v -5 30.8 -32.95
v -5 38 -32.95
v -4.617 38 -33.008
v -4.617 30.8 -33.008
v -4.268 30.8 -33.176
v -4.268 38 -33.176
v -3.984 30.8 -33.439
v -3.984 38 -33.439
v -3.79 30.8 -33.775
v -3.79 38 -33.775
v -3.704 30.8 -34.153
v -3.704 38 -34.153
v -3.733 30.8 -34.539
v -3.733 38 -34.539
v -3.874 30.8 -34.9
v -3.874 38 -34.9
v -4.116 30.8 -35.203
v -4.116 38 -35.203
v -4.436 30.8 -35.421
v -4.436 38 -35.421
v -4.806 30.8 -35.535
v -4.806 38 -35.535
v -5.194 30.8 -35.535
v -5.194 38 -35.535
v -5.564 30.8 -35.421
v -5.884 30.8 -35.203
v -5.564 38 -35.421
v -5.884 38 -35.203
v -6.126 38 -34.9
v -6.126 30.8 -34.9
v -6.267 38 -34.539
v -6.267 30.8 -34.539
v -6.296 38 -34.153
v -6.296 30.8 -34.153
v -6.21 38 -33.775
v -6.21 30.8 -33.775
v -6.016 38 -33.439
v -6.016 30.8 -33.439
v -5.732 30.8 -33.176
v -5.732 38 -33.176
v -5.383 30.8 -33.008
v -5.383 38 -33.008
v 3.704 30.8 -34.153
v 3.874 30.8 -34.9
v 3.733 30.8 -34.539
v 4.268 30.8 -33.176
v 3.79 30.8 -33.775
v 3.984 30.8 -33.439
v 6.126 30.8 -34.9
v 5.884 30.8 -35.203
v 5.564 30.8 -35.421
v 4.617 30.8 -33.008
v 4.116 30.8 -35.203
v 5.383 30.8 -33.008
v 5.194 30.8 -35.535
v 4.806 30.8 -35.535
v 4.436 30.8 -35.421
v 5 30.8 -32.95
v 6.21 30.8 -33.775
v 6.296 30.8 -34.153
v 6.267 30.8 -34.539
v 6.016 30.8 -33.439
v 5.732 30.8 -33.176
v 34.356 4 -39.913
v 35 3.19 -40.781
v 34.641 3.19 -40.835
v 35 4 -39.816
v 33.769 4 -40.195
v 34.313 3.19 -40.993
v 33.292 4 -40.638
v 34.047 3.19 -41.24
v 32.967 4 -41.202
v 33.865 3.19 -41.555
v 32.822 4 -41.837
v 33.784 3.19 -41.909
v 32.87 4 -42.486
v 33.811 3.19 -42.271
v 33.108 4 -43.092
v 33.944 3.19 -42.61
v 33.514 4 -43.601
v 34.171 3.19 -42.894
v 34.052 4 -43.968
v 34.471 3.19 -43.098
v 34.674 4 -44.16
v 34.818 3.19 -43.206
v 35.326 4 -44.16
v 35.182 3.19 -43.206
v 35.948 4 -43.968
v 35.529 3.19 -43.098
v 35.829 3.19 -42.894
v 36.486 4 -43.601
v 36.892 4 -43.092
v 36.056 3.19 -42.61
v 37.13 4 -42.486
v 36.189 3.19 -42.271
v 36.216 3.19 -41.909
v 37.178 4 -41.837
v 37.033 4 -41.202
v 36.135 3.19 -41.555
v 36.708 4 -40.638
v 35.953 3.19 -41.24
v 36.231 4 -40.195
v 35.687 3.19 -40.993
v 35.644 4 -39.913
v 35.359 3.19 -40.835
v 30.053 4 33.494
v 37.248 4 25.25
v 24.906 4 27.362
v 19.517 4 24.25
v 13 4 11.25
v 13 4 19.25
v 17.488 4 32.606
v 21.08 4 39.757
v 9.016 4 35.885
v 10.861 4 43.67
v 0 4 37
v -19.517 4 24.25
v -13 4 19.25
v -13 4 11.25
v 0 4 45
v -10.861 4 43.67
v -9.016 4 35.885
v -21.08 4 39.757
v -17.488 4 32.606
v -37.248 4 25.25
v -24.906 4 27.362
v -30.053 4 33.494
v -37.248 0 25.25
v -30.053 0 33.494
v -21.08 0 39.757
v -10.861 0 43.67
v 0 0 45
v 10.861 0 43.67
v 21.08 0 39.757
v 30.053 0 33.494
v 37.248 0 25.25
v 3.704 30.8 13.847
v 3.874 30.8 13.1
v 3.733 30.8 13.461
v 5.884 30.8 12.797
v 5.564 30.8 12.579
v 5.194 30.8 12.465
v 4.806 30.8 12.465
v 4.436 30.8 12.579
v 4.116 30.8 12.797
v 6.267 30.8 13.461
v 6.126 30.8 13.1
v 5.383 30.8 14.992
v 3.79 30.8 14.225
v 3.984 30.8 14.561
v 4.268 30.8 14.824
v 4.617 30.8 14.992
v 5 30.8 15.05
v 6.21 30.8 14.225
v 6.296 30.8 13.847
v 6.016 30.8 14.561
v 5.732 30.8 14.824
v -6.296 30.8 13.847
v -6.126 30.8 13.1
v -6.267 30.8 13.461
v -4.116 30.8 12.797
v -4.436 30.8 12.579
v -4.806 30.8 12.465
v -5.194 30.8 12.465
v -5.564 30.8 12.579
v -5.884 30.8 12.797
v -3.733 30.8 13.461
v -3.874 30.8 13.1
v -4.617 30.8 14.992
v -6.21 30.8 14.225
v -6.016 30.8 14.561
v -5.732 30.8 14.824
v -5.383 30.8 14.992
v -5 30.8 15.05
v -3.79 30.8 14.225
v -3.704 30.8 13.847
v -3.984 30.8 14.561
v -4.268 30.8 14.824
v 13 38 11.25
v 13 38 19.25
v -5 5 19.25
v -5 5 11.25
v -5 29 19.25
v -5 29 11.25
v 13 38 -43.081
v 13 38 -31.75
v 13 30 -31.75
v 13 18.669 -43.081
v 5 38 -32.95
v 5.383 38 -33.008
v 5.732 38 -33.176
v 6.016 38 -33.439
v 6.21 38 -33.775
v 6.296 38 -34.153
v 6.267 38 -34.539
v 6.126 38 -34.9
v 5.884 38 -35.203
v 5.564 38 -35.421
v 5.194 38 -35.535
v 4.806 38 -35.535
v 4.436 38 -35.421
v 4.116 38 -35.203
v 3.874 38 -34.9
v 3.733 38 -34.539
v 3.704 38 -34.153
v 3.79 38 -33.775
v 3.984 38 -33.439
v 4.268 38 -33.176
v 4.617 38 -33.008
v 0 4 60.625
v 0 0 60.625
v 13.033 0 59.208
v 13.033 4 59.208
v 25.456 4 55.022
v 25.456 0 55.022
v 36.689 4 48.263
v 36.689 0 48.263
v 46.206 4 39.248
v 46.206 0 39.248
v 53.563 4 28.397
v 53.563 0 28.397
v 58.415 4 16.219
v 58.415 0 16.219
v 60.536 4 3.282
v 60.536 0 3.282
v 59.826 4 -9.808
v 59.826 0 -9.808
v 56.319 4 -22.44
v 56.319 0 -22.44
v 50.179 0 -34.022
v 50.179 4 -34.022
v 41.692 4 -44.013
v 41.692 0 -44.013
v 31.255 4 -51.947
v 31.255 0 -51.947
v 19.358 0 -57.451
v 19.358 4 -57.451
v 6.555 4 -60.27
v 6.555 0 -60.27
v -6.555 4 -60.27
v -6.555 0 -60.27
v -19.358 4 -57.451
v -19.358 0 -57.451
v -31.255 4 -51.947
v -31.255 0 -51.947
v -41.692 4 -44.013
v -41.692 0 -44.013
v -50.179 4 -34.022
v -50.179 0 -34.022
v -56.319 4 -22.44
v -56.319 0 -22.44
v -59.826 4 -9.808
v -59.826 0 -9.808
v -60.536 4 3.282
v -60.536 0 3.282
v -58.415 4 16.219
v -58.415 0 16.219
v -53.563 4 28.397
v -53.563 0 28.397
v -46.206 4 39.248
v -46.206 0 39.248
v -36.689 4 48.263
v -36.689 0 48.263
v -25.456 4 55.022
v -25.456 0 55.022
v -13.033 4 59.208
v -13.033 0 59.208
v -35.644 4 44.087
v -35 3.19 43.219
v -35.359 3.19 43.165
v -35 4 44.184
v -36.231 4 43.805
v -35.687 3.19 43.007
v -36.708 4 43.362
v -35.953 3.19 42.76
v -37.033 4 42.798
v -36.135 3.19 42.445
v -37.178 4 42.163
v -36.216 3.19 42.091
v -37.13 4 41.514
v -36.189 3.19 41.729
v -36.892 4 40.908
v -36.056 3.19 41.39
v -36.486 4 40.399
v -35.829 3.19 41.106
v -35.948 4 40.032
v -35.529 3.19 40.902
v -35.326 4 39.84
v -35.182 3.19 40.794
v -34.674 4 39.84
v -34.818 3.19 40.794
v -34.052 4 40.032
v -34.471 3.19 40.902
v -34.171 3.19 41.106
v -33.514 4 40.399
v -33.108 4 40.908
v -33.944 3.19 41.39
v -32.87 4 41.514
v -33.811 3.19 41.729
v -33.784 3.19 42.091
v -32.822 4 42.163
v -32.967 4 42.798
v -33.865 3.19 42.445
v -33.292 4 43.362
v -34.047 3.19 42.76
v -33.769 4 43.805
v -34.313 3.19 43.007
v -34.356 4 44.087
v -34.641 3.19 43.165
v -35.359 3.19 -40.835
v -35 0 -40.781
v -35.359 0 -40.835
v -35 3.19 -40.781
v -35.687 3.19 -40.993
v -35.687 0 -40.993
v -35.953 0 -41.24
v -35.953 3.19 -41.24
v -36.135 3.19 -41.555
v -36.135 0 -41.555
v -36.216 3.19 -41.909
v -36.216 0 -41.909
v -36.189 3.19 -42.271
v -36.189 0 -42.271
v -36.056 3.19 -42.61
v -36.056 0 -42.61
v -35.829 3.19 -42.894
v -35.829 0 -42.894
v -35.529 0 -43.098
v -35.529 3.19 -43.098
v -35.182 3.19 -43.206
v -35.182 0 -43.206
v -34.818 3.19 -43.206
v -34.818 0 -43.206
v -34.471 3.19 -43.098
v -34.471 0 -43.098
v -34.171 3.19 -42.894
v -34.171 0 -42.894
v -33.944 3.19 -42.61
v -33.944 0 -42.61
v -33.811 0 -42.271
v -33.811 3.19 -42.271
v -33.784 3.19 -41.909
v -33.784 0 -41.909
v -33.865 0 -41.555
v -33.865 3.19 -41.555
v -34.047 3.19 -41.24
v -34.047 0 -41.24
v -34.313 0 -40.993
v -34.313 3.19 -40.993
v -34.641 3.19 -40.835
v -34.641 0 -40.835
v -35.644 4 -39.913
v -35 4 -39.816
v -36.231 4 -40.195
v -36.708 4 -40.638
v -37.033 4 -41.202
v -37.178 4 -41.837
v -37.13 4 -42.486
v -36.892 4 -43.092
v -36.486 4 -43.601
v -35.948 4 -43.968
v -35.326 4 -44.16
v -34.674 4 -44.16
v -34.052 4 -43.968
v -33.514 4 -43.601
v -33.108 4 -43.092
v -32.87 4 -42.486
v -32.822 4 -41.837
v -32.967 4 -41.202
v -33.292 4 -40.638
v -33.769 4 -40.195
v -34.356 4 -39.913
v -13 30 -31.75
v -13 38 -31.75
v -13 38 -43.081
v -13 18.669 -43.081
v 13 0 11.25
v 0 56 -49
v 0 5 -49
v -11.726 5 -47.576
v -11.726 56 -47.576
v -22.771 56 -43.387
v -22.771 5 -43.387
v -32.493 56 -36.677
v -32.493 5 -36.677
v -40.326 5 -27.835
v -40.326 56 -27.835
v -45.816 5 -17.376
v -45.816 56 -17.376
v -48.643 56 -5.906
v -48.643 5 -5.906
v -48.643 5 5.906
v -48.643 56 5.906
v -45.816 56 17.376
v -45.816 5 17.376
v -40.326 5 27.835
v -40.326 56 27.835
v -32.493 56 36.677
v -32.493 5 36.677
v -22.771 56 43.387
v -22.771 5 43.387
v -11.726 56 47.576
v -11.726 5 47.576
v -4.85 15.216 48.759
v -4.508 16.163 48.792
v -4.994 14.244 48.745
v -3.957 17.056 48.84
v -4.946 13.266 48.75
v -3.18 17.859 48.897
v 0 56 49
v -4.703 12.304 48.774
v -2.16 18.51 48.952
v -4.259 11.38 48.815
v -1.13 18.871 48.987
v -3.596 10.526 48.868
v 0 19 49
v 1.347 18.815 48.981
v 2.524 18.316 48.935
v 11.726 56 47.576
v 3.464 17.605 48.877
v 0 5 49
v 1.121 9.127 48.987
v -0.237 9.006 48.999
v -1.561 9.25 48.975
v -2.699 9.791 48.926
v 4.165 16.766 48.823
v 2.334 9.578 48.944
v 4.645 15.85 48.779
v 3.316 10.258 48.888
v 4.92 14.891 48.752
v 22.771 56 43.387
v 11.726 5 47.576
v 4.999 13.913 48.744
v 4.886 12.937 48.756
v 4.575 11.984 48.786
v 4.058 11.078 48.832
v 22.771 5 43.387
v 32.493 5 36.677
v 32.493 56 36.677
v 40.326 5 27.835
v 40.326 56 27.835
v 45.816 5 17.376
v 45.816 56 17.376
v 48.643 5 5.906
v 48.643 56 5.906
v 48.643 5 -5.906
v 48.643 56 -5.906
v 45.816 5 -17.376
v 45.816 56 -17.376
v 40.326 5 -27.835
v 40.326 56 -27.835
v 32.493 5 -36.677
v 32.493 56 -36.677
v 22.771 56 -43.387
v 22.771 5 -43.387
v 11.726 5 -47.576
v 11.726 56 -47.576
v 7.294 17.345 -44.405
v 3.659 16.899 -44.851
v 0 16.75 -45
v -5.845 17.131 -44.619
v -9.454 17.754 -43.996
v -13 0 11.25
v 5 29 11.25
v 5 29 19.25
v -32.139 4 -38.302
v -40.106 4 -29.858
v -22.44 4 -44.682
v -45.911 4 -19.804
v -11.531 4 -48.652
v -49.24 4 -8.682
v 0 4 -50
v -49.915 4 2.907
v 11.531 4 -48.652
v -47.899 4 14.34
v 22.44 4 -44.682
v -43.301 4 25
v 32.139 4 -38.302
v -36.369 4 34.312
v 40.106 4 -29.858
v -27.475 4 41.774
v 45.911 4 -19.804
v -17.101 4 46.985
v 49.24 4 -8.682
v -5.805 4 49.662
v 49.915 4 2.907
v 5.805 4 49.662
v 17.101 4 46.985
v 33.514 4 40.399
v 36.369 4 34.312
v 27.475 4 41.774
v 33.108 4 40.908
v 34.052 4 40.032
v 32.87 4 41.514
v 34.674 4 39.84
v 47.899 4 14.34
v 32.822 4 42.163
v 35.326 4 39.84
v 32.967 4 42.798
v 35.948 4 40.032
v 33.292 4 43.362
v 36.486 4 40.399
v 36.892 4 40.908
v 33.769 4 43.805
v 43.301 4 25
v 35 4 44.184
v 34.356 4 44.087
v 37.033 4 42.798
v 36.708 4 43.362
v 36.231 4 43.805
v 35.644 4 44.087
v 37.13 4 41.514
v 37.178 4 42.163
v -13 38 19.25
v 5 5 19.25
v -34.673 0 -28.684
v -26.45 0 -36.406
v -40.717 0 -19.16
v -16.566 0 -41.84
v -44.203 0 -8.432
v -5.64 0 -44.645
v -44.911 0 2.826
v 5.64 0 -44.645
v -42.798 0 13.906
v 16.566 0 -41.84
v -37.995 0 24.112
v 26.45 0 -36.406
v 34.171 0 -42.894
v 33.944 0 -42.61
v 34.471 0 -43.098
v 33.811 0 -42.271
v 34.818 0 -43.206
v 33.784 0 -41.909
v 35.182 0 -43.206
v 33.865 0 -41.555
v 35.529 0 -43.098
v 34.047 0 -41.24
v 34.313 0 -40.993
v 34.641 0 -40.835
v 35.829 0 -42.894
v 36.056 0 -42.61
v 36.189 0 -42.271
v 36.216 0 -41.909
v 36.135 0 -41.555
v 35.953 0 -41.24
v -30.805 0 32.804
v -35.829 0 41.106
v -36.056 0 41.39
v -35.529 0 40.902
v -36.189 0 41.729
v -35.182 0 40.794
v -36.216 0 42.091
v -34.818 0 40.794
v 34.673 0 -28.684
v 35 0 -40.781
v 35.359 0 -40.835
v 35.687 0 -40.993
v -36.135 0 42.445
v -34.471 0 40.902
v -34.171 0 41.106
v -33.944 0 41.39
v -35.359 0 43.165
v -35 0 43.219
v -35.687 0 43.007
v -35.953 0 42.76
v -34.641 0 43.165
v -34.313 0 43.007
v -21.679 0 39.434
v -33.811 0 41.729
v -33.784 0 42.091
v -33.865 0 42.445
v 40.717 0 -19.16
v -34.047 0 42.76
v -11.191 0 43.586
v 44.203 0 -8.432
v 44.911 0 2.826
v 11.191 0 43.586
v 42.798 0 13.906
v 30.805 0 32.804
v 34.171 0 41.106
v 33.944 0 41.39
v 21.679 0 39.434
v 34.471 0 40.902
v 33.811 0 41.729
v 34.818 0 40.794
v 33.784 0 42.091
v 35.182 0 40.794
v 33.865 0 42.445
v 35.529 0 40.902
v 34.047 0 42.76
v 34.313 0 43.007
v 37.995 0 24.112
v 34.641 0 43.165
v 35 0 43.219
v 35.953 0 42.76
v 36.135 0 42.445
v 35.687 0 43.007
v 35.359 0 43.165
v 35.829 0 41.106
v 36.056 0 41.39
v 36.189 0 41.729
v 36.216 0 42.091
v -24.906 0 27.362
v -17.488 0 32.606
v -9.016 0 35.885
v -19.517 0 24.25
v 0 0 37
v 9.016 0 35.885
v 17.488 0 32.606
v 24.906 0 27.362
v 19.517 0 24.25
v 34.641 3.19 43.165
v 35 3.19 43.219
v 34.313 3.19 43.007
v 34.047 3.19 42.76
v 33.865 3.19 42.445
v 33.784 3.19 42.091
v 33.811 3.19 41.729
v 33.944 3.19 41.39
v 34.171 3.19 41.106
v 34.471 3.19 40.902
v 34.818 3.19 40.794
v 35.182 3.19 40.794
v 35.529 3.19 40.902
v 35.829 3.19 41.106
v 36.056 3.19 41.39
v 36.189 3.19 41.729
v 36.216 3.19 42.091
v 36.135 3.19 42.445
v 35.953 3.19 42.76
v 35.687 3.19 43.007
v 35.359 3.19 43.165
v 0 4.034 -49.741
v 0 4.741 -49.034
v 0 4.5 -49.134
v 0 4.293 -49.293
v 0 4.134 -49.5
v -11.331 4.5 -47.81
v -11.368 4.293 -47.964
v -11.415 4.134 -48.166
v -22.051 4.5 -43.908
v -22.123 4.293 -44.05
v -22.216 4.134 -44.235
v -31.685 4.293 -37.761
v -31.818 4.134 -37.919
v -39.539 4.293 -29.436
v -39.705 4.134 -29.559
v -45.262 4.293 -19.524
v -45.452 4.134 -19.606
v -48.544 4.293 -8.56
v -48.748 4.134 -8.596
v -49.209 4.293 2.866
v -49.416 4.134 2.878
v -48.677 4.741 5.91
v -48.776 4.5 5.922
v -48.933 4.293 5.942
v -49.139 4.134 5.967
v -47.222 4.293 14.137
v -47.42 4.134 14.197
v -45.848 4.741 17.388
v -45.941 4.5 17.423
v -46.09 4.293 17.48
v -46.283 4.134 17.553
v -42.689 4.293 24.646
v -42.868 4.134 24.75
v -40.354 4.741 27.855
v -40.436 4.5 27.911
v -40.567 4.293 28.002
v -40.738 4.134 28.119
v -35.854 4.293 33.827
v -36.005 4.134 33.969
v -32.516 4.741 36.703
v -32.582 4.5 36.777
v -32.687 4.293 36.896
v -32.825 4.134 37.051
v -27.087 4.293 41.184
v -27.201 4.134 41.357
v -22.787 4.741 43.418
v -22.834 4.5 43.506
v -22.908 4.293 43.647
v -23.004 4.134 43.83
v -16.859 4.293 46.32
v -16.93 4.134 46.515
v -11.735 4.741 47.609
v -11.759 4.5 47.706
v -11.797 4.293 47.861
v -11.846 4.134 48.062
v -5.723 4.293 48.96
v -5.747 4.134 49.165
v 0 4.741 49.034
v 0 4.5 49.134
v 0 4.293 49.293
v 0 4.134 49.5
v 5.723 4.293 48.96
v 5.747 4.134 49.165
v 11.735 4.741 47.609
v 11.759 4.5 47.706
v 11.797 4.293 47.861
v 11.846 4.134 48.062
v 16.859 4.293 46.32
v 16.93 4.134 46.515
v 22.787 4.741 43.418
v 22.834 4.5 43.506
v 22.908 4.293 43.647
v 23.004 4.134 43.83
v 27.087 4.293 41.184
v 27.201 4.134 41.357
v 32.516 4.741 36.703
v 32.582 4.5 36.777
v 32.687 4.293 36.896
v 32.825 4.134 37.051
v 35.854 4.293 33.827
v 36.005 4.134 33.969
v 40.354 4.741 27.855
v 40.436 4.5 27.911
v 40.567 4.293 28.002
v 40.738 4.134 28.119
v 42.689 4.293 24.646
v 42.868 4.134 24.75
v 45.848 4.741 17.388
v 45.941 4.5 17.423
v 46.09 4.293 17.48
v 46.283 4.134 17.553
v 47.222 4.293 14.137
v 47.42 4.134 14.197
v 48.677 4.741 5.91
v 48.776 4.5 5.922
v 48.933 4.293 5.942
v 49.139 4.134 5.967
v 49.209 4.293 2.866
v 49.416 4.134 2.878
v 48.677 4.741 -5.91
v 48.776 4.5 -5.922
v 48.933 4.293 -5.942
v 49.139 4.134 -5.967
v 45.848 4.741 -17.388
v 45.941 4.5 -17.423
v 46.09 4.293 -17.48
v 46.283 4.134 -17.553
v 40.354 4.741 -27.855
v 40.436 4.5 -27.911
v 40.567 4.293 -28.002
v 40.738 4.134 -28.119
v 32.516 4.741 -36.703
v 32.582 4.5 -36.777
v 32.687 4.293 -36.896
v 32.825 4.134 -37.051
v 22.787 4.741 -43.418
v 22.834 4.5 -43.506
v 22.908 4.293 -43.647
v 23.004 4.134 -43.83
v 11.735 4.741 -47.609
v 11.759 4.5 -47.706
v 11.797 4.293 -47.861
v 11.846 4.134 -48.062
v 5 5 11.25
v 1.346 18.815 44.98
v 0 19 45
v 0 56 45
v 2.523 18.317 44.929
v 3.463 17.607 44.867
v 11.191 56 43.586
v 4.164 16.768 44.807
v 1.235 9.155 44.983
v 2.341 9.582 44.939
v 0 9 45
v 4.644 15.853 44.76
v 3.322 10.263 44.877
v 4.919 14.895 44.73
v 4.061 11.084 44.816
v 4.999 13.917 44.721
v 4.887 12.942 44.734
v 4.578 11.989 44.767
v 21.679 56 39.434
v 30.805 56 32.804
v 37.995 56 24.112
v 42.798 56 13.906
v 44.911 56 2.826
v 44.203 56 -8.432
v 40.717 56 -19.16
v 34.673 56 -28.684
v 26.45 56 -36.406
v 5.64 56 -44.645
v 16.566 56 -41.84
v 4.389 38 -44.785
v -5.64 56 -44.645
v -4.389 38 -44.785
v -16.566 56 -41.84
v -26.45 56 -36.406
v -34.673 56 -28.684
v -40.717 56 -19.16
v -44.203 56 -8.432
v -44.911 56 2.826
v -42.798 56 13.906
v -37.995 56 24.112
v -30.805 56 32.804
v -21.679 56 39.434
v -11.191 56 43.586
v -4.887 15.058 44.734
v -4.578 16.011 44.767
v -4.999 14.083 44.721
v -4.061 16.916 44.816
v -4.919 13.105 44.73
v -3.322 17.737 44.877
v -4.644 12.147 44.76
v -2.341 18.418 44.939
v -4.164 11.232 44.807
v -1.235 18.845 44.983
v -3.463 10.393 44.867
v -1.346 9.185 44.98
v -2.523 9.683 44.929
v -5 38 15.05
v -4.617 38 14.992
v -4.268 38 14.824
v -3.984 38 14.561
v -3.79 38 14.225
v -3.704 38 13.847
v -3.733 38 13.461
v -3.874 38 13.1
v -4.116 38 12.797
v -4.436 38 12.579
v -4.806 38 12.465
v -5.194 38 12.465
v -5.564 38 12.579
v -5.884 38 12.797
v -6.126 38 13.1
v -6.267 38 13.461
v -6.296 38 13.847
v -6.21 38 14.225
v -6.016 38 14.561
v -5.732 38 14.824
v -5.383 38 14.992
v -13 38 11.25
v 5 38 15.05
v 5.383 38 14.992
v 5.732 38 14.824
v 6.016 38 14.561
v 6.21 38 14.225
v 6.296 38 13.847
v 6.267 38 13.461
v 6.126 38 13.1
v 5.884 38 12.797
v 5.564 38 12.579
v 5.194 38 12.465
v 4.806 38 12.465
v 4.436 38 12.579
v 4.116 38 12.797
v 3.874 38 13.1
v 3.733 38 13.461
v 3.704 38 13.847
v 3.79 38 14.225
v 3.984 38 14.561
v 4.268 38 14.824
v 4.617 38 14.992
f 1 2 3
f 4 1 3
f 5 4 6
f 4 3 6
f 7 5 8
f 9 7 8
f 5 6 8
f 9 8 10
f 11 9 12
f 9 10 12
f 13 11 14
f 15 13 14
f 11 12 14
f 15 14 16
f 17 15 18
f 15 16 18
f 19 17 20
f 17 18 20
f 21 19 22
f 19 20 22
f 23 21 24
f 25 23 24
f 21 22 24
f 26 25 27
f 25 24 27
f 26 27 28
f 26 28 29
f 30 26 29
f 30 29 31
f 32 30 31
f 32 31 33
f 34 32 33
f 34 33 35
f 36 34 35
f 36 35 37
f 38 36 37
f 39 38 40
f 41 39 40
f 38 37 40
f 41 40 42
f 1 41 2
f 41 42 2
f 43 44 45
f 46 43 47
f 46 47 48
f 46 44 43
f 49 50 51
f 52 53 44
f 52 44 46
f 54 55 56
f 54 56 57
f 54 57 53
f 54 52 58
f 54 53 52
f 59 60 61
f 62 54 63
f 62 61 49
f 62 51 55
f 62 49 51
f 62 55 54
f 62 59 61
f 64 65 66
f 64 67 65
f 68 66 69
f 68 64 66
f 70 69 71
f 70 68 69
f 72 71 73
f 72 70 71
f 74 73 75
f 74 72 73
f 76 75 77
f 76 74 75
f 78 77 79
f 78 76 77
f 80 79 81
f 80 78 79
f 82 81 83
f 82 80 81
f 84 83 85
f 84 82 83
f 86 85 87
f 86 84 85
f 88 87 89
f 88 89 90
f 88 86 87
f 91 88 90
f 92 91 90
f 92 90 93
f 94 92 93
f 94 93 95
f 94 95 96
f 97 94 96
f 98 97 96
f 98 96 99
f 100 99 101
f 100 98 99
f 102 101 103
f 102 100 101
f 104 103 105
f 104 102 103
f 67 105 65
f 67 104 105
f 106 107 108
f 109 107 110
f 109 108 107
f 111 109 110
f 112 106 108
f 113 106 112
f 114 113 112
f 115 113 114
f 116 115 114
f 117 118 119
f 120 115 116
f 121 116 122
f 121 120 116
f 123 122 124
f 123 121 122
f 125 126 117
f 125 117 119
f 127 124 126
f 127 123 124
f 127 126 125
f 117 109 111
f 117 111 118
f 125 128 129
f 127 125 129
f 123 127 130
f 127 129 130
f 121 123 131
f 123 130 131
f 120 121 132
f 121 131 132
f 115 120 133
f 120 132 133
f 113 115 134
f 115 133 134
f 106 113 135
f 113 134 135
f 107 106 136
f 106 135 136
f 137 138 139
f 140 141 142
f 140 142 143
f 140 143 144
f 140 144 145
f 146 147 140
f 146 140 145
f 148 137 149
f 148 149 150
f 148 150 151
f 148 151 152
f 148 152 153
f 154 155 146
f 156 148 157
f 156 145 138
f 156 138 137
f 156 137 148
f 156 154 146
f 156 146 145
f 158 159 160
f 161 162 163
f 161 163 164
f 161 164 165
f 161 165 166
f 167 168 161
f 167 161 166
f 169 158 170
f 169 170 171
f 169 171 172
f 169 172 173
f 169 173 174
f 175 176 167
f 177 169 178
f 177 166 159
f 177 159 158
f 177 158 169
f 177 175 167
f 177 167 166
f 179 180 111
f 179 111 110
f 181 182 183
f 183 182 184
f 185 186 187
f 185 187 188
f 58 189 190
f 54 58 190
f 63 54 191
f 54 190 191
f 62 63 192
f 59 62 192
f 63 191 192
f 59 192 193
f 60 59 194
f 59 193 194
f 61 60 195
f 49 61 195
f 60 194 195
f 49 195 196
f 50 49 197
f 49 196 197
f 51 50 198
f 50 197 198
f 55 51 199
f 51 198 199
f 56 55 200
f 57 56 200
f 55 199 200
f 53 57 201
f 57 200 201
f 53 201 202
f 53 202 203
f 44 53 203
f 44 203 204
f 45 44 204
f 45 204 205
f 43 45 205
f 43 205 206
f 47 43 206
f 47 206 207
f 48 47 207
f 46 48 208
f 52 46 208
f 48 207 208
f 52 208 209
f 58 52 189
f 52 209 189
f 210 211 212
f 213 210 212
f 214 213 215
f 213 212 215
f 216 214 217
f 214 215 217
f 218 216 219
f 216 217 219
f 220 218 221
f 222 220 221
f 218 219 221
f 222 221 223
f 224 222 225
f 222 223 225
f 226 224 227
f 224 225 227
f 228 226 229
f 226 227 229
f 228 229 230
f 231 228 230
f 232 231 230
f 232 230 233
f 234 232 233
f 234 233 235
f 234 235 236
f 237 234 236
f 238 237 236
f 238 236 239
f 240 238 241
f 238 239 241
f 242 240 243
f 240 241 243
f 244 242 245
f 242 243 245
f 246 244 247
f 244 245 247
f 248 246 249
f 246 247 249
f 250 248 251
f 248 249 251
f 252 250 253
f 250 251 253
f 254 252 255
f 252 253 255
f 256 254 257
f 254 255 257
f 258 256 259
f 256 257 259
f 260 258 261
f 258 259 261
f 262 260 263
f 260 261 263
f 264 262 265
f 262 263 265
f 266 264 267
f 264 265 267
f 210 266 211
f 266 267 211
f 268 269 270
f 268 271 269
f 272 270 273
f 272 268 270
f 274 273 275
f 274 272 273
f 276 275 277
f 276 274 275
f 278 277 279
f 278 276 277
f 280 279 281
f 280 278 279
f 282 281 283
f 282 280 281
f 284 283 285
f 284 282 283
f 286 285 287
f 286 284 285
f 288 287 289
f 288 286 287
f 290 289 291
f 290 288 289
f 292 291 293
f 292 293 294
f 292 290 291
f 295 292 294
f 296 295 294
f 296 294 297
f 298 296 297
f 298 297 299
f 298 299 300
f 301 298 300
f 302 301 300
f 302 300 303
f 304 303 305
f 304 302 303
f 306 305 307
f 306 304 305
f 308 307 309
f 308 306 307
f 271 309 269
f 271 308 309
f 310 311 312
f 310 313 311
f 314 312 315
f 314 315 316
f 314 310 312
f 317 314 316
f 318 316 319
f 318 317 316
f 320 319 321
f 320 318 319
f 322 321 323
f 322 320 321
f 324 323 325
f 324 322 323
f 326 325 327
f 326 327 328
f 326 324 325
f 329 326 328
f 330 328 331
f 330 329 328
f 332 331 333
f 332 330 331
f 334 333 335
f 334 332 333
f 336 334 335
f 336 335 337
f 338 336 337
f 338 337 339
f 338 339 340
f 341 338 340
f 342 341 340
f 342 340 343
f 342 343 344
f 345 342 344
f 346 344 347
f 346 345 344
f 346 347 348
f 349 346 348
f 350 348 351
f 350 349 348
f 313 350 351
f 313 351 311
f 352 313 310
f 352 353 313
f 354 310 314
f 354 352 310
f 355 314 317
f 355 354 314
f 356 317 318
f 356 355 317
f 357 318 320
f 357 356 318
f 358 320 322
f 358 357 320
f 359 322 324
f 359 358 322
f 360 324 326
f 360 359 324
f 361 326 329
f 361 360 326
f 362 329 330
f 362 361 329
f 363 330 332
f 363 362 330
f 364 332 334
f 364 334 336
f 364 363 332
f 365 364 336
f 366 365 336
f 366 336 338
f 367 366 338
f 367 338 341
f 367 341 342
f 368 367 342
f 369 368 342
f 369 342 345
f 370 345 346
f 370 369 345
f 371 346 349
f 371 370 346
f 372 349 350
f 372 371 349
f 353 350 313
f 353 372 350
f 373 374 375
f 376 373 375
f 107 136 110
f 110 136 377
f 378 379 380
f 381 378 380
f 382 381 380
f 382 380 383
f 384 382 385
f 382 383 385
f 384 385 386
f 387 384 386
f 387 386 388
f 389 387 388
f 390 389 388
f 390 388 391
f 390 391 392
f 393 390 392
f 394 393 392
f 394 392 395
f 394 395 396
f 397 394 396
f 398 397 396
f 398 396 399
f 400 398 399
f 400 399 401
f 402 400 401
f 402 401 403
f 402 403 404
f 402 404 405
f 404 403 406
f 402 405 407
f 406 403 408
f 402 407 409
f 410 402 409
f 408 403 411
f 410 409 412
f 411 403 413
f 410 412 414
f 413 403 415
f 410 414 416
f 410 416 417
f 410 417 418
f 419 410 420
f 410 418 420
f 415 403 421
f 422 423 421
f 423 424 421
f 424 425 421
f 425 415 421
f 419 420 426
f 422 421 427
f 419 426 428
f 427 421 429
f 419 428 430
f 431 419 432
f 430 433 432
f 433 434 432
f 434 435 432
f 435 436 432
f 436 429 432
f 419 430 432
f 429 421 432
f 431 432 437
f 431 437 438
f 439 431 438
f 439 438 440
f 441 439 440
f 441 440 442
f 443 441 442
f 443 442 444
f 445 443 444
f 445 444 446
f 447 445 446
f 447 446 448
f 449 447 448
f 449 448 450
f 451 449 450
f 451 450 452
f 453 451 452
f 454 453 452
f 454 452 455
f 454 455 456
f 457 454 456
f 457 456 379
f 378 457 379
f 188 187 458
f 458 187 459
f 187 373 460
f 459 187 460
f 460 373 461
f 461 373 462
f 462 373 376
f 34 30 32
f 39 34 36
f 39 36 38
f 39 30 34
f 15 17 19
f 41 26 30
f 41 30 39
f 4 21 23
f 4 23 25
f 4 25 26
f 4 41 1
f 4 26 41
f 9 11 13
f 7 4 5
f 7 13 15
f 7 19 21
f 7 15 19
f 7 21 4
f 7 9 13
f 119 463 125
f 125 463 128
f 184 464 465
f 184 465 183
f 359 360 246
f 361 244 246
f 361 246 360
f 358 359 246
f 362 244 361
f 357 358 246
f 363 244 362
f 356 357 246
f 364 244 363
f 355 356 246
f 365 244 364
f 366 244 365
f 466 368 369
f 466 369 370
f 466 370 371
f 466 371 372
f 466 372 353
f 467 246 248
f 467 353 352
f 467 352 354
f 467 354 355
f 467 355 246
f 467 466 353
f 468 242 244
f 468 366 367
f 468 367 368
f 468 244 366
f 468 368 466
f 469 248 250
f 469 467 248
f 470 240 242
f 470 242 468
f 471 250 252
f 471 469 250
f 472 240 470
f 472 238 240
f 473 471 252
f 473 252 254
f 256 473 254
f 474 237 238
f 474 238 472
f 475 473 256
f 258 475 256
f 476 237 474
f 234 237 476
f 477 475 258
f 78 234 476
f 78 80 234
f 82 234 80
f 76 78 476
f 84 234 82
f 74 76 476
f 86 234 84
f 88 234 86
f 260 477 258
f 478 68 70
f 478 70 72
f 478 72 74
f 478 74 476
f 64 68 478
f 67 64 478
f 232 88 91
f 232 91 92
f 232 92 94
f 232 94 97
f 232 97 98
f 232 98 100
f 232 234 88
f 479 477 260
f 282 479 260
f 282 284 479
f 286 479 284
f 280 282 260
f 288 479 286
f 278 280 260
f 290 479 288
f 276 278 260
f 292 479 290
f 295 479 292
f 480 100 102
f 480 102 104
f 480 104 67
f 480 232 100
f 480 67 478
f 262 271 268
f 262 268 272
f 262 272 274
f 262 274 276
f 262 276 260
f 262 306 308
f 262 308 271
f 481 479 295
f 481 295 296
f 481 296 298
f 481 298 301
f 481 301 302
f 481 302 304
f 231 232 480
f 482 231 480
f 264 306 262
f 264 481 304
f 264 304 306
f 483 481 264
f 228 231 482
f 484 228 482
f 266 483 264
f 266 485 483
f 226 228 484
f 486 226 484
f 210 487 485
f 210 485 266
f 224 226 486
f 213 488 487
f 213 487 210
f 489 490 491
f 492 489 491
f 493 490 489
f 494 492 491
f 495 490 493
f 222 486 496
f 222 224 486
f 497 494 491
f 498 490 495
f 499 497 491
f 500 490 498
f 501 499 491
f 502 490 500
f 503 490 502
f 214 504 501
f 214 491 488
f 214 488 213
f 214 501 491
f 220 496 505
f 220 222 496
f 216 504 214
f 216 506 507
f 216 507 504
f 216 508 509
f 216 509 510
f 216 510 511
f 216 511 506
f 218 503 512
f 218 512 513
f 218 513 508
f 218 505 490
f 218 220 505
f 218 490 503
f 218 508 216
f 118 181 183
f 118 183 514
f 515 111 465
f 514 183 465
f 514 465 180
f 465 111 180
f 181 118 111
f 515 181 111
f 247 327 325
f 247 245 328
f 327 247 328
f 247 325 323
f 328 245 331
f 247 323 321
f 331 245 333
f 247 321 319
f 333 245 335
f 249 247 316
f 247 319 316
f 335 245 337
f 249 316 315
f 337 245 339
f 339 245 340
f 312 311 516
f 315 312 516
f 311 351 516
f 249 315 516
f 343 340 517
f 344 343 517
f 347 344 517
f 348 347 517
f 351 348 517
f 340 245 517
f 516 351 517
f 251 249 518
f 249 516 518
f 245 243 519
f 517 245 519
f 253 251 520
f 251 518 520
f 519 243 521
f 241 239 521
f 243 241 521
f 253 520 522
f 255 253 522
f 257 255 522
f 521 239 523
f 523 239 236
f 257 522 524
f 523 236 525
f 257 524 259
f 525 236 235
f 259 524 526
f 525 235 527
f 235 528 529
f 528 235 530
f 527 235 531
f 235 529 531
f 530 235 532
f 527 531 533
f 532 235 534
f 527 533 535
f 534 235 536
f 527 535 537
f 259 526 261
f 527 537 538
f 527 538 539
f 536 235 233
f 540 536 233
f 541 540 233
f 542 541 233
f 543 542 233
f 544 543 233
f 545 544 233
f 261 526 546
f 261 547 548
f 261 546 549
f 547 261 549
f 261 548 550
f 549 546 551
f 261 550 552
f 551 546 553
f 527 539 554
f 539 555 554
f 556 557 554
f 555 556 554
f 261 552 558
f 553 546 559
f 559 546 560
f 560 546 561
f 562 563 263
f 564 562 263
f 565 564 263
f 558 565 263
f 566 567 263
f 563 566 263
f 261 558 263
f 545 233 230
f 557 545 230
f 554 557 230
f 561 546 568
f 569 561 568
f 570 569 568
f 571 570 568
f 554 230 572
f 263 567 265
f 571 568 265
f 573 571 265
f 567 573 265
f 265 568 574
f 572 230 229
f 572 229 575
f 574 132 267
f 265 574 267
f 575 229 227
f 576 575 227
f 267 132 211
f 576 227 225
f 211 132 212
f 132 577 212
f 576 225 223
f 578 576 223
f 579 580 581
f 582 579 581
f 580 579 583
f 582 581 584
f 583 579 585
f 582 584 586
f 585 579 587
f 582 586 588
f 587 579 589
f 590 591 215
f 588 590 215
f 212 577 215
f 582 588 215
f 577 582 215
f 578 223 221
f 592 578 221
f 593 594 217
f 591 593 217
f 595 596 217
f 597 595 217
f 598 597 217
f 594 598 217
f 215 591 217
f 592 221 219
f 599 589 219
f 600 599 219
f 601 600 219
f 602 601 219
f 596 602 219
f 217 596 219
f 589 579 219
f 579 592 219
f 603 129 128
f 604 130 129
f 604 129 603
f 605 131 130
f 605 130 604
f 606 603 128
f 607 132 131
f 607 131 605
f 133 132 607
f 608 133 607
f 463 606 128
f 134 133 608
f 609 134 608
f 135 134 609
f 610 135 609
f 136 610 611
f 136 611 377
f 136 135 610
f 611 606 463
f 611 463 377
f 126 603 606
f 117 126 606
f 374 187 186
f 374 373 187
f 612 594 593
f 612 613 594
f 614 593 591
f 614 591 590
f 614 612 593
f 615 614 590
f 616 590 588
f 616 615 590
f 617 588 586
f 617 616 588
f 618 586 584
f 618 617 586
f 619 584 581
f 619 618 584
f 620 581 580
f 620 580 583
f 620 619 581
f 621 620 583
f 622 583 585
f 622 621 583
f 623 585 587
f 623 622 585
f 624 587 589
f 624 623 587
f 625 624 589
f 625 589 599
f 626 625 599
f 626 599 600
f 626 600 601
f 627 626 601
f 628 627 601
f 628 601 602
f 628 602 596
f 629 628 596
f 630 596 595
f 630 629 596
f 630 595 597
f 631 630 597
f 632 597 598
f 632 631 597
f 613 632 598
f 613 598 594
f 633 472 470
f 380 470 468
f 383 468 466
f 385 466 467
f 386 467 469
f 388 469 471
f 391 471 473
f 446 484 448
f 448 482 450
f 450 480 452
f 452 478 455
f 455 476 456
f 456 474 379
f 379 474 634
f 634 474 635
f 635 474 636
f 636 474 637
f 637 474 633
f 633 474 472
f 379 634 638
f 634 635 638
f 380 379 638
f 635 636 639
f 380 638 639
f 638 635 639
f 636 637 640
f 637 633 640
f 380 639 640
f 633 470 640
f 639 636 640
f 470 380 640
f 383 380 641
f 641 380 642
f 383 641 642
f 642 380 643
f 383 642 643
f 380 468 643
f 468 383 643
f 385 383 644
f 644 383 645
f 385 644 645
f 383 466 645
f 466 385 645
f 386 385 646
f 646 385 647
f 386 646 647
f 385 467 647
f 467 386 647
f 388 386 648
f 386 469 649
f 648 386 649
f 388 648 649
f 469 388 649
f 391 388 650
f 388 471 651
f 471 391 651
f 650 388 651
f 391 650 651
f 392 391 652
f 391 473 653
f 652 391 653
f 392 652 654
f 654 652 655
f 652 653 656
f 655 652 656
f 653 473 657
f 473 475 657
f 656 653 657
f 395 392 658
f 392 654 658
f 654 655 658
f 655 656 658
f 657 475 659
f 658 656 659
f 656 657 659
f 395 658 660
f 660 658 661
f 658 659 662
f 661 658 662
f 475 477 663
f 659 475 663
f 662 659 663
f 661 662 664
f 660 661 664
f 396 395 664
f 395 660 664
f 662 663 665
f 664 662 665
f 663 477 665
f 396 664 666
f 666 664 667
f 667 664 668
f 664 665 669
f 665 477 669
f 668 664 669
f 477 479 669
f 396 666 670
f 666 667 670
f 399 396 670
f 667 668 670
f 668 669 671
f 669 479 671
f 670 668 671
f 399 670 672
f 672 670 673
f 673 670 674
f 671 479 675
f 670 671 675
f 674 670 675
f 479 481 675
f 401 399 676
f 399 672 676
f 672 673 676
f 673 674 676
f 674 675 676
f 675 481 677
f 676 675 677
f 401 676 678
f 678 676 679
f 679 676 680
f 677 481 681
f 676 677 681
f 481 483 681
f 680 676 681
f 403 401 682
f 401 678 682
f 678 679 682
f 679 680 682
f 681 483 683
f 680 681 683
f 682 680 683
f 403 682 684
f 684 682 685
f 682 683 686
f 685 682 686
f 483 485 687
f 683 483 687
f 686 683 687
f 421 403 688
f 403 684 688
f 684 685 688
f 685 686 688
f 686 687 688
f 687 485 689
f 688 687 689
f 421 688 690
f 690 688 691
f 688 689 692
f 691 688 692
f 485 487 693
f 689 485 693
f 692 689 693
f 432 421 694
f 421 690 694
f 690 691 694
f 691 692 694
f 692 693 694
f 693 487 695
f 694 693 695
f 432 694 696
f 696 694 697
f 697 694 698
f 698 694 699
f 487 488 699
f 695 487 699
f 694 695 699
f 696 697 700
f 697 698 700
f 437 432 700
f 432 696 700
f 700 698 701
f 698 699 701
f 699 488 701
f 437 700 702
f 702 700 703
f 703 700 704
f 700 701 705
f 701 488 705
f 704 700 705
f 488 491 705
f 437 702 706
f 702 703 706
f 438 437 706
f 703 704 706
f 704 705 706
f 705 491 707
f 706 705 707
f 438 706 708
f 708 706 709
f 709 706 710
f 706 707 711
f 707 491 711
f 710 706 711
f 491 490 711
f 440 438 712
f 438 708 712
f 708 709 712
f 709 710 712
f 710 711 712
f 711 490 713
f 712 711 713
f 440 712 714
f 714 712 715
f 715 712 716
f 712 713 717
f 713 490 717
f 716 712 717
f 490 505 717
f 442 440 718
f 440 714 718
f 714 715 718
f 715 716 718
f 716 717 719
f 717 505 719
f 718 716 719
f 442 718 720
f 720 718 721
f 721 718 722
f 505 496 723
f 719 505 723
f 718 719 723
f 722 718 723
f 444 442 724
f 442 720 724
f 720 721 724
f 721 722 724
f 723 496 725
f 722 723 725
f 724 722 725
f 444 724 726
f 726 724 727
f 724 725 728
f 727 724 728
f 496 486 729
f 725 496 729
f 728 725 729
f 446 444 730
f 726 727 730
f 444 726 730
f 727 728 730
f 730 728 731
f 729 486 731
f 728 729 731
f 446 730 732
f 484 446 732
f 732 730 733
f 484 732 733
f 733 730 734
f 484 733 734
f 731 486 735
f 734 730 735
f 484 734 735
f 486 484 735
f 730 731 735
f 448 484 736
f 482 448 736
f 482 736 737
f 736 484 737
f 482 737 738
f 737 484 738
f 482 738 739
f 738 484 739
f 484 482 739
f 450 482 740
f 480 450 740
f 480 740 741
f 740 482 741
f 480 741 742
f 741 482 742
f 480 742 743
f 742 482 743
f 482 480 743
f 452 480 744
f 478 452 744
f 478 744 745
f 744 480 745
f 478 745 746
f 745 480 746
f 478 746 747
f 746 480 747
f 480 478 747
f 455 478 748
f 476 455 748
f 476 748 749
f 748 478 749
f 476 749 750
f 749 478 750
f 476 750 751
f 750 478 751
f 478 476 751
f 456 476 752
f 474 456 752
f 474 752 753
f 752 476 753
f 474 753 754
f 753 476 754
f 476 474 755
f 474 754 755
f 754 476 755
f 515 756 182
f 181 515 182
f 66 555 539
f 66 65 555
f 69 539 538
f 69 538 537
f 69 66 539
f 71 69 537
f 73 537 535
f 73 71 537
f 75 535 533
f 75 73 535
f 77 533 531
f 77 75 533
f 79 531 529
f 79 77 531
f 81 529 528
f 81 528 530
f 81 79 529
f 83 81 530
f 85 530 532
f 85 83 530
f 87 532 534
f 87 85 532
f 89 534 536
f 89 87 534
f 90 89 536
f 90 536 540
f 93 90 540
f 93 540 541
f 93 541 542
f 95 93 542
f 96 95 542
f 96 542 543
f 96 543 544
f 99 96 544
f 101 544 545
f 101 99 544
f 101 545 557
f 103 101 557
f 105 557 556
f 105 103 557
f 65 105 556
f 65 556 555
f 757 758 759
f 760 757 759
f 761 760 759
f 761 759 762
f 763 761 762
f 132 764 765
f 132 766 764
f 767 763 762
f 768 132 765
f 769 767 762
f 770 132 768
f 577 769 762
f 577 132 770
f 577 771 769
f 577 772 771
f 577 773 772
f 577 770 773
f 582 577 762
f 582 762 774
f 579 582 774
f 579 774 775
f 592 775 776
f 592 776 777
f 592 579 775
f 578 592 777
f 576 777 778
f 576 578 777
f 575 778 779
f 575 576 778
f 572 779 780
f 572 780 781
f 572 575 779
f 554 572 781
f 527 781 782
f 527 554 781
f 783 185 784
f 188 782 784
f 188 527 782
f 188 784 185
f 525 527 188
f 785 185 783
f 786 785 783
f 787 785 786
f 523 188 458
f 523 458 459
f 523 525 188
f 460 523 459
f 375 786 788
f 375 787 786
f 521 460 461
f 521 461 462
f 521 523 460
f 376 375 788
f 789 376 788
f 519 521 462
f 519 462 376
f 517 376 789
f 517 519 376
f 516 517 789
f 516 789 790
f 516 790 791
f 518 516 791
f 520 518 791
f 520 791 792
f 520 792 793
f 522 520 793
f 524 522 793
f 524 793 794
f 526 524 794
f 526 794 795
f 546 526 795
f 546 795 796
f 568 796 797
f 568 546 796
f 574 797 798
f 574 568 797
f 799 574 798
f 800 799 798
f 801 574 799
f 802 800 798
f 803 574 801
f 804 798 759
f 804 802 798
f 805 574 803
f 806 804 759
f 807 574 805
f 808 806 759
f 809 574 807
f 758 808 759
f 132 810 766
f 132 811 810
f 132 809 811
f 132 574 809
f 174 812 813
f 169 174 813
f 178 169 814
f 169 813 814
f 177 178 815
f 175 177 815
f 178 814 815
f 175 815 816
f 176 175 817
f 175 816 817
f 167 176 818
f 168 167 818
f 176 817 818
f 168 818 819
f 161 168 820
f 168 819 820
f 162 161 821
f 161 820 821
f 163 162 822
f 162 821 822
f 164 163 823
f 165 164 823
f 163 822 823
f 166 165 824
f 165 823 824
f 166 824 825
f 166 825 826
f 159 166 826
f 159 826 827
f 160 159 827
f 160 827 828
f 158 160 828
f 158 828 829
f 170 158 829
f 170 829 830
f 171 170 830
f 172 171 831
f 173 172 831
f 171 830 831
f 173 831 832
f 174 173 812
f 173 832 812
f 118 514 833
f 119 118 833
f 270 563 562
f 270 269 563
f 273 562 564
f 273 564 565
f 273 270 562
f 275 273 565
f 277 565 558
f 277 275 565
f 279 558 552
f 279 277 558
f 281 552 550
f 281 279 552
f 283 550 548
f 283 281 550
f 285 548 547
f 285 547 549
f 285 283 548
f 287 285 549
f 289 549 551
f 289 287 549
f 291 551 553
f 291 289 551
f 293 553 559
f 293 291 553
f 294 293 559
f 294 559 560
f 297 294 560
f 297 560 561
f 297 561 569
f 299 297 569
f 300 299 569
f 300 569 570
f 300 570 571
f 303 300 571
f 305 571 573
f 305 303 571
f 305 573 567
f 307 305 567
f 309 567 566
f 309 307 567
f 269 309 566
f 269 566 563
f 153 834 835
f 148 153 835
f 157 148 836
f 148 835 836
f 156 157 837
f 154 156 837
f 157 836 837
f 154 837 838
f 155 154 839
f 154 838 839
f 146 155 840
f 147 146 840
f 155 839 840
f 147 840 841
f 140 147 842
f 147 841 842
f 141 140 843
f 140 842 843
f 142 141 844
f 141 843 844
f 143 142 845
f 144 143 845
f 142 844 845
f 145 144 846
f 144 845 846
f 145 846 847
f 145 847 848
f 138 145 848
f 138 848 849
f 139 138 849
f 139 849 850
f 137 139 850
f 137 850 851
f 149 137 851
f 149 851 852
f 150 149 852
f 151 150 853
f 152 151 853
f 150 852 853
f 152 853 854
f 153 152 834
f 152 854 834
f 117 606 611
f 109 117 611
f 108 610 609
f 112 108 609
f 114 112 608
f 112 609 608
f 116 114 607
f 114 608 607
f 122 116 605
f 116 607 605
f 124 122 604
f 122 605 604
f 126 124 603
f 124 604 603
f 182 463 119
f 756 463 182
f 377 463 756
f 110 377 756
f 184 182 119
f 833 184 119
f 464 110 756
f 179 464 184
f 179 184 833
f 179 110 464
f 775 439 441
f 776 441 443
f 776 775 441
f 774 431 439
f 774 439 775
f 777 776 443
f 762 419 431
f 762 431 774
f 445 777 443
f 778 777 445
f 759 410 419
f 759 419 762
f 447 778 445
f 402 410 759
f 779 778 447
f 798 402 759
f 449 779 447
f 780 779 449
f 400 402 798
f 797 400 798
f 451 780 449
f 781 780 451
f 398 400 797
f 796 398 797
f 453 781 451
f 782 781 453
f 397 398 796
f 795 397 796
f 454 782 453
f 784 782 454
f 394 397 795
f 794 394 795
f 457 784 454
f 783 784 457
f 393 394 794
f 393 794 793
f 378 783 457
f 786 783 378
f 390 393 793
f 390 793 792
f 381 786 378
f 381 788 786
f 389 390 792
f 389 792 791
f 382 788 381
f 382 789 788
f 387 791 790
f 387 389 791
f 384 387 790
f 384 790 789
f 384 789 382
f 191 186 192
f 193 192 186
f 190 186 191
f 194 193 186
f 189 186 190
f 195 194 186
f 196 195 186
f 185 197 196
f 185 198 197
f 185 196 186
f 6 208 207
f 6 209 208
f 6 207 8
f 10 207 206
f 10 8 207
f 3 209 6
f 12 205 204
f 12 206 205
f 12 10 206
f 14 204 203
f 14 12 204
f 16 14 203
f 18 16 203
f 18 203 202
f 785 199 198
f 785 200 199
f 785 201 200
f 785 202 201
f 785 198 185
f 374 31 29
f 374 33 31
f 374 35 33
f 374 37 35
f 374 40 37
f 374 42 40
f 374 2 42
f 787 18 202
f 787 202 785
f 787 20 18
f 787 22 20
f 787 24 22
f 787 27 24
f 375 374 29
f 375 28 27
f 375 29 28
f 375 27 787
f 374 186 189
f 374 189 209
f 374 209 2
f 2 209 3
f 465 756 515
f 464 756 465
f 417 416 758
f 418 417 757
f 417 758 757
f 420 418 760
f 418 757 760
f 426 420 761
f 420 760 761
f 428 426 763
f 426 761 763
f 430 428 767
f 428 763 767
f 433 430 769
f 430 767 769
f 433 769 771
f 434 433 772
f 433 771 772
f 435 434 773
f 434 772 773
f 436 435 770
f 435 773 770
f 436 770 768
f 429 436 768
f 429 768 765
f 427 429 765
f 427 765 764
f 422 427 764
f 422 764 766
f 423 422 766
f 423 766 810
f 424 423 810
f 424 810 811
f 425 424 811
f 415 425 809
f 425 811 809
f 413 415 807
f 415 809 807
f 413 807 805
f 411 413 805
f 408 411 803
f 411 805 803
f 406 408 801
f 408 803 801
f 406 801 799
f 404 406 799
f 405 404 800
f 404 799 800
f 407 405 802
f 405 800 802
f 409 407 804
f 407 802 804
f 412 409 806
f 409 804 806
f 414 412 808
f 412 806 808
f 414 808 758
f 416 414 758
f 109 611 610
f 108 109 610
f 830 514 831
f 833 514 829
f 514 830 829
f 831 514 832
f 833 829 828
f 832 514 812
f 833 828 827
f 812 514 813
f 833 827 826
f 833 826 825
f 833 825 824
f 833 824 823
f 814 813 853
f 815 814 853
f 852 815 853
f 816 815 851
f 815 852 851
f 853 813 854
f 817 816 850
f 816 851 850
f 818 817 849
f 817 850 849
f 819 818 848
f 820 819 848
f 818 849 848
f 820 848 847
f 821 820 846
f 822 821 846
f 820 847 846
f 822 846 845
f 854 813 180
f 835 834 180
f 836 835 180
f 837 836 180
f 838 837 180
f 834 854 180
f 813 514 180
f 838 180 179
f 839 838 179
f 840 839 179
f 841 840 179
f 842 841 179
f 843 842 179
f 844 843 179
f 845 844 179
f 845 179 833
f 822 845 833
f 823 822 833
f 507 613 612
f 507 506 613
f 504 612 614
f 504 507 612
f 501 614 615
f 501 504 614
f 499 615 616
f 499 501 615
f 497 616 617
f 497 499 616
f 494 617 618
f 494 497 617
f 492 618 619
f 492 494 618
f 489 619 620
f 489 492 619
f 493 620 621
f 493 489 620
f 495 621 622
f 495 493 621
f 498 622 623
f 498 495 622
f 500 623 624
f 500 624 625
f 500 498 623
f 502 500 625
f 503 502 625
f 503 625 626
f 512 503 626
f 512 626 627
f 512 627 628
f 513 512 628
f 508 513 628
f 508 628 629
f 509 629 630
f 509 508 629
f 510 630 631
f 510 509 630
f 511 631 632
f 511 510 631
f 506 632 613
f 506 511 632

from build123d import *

# Parameters (mm, degrees)
SKETCH1_R                                 = 60.625
SKETCH1_R_2                               = 45
BOSS_EXTRUDE1_DEPTH                       = 4
SKETCH2_R                                 = 49
SKETCH2_R_2                               = 45
BOSS_EXTRUDE2_DEPTH                       = 52
SKETCH3_W                                 = 13.25
SKETCH3_H                                 = 8
SKETCH3_W_2                               = 8
SKETCH3_H_2                               = 38
BOSS_EXTRUDE3_DEPTH                       = 13
SKETCH4_W                                 = 10
SKETCH4_H                                 = 24
CUT_EXTRUDE1_DEPTH                        = 26
SKETCH7_R                                 = 5
CUT_EXTRUDE2_DEPTH                        = 64
SKETCH11_R                                = 1.3
CUT_EXTRUDE5_DEPTH                        = 7.2
BOSS_EXTRUDE4_DEPTH                       = 4
CSK_FOR_2_FLAT_HEAD_MACHINE_SCREW_2_COUNT = 2
CSK_FOR_2_FLAT_HEAD_MACHINE_SCREW_2_PITCH = 70
CSK_FOR_2_FLAT_HEAD_MACHINE_SCREW_3_COUNT = 2
CSK_FOR_2_FLAT_HEAD_MACHINE_SCREW_3_PITCH = 109.343495463
CSK_FOR_2_FLAT_HEAD_MACHINE_SCREW_4_COUNT = 2
CSK_FOR_2_FLAT_HEAD_MACHINE_SCREW_4_PITCH = 84
FILLET1_R                                 = 1


with BuildPart() as part:
    # Sketch1 → Boss-Extrude1 (new body)
    with BuildSketch(Plane(origin=(0, 0, 0), x_dir=(1, 0, 0), z_dir=(0, 1, 0))):
        with Locations(Location((0, 0, 0), (0, 0, 270))):
            Circle(SKETCH1_R)
        with Locations(Location((0, 0, 0), (0, 0, 270))):
            Circle(SKETCH1_R_2, mode=Mode.SUBTRACT)
    extrude(amount=BOSS_EXTRUDE1_DEPTH)

    # Sketch2 → Boss-Extrude2 (add)
    with BuildSketch(Plane(origin=(0, 4, 0), x_dir=(1, 0, 0), z_dir=(0, 1, 0))):
        with Locations(Location((0, 0, 0), (0, 0, 90))):
            Circle(SKETCH2_R)
        with Locations(Location((0, 0, 0), (0, 0, 270))):
            Circle(SKETCH2_R_2, mode=Mode.SUBTRACT)
    extrude(amount=BOSS_EXTRUDE2_DEPTH)

    # Sketch3 → Boss-Extrude3 (add, symmetric)
    with BuildSketch(Plane(origin=(0, 0, 0), x_dir=(0, 0, -1), z_dir=(1, 0, 0))):
        with Locations((38.375, 34)):
            Rectangle(SKETCH3_W, SKETCH3_H)
        Polygon((45, 16.75), (45, 30), (31.75, 30), align=None)
        with Locations((-15.25, 19)):
            Rectangle(SKETCH3_W_2, SKETCH3_H_2)
    extrude(amount=BOSS_EXTRUDE3_DEPTH, both=True)


with BuildPart() as boss_extrude3_piece_1:
    # of the separate pieces the step leaves, piece 1, a body of its own (boss_extrude3_pieces)
    add(part.part.solids().sort_by_distance((0, 0, 60.625))[0])

    # Sketch7 → Cut-Extrude2 (cut)
    with BuildSketch(Plane(origin=(0, 0, 11.25), x_dir=(-1, 0, 0), z_dir=(0, 0, -1))):
        with Locations(Location((0, 14, 0), (0, 0, 90))):
            Circle(SKETCH7_R)
    extrude(amount=-CUT_EXTRUDE2_DEPTH, mode=Mode.SUBTRACT)


with BuildPart() as boss_extrude3_piece_2:
    # of the separate pieces the step leaves, piece 2, a body of its own (boss_extrude3_pieces)
    add(part.part.solids().sort_by_distance((-13, 38, 11.25))[0])

    # Sketch4 → Cut-Extrude1 (cut)
    with BuildSketch(Plane(origin=(0, 0, 11.25), x_dir=(-1, 0, 0), z_dir=(0, 0, -1))):
        with Locations((0, 17)):
            Rectangle(SKETCH4_W, SKETCH4_H)
    extrude(amount=-CUT_EXTRUDE1_DEPTH, mode=Mode.SUBTRACT)


with BuildPart() as cut_extrude5_tool:
    # Sketch11 → Cut-Extrude5 (new body)
    with BuildSketch(Plane(origin=(0, 38, 0), x_dir=(1, 0, 0), z_dir=(0, 1, 0))):
        with Locations(Location((-5, 34.25, 0), (0, 0, 270))):
            Circle(SKETCH11_R)
        with Locations(Location((5, 34.25, 0), (0, 0, 270))):
            Circle(SKETCH11_R)
        with Locations(Location((-5, -13.75, 0), (0, 0, 270))):
            Circle(SKETCH11_R)
        with Locations(Location((5, -13.75, 0), (0, 0, 270))):
            Circle(SKETCH11_R)
    extrude(amount=-CUT_EXTRUDE5_DEPTH)


with BuildPart() as boss_extrude3_piece_1_1:
    add(boss_extrude3_piece_1.part)

    # Cut-Extrude5: cut by cut_extrude5_tool
    add(cut_extrude5_tool.part, mode=Mode.SUBTRACT)

    # Sketch14 → CSK for #2 Flat Head Machine Screw (100)1 (revolve, cut)
    with BuildSketch(Plane(origin=(35, 4, -42), x_dir=(0, 0, 1), z_dir=(1, 0, 0))):
        Polygon((0, 0), (0, 4), (1.2192, 4), (1.2192, 0.809898964), (2.1844, 0), align=None)
    csk_for_2_flat_head_machine_screw_100 = revolve(axis=Axis((35, 10.35, -42), (0, -1, 0)), mode=Mode.SUBTRACT)

    # CSK for _2 Flat Head Machine Screw _ 2: CSK for #2 Flat Head Machine Screw (100)1 ×2
    with Locations(*[(-i * CSK_FOR_2_FLAT_HEAD_MACHINE_SCREW_2_PITCH, 0, 0) for i in range(1, CSK_FOR_2_FLAT_HEAD_MACHINE_SCREW_2_COUNT)]):
        add(csk_for_2_flat_head_machine_screw_100, mode=Mode.SUBTRACT)

    # CSK for _2 Flat Head Machine Screw _ 3: CSK for #2 Flat Head Machine Screw (100)1 ×2
    with Locations(*[Vector(-0.6401843996644799, 0, 0.7682212795973759) * (i * CSK_FOR_2_FLAT_HEAD_MACHINE_SCREW_3_PITCH) for i in range(1, CSK_FOR_2_FLAT_HEAD_MACHINE_SCREW_3_COUNT)]):
        add(csk_for_2_flat_head_machine_screw_100, mode=Mode.SUBTRACT)

    # CSK for _2 Flat Head Machine Screw _ 4: CSK for #2 Flat Head Machine Screw (100)1 ×2
    with Locations(*[(0, 0, i * CSK_FOR_2_FLAT_HEAD_MACHINE_SCREW_4_PITCH) for i in range(1, CSK_FOR_2_FLAT_HEAD_MACHINE_SCREW_4_COUNT)]):
        add(csk_for_2_flat_head_machine_screw_100, mode=Mode.SUBTRACT)

    # Fillet1
    fillet1_edges = [boss_extrude3_piece_1_1.edges().sort_by_distance(p)[0] for p in [
        (0, 4, 49),
    ]]
    fillet(fillet1_edges, radius=FILLET1_R)


with BuildPart() as boss_extrude3_piece_2_1:
    add(boss_extrude3_piece_2.part)

    # Cut-Extrude5: cut by cut_extrude5_tool
    add(cut_extrude5_tool.part, mode=Mode.SUBTRACT)

    # Sketch12 → Boss-Extrude4 (add)
    with BuildSketch(Plane.XZ):
        with BuildLine():
            Line((13, 11.25), (-13, 11.25))
            Line((-13, 11.25), (-37.248431585, 25.249838503))
            ThreePointArc((-37.248431585, 25.249838503), (0, 45), (37.248431585, 25.249838503))
            Line((37.248431585, 25.249838503), (13, 11.25))
        make_face()
        with BuildLine():
            Line((-24.906460381, 27.361802413), (-19.516660498, 24.25))
            Line((-19.516660498, 24.25), (19.516660498, 24.25))
            Line((19.516660498, 24.25), (24.906460381, 27.361802413))
            ThreePointArc((24.906460381, 27.361802413), (0, 37), (-24.906460381, 27.361802413))
        make_face(mode=Mode.SUBTRACT)
    extrude(amount=-BOSS_EXTRUDE4_DEPTH)


solid = Compound([boss_extrude3_piece_1_1.part, boss_extrude3_piece_2_1.part])
